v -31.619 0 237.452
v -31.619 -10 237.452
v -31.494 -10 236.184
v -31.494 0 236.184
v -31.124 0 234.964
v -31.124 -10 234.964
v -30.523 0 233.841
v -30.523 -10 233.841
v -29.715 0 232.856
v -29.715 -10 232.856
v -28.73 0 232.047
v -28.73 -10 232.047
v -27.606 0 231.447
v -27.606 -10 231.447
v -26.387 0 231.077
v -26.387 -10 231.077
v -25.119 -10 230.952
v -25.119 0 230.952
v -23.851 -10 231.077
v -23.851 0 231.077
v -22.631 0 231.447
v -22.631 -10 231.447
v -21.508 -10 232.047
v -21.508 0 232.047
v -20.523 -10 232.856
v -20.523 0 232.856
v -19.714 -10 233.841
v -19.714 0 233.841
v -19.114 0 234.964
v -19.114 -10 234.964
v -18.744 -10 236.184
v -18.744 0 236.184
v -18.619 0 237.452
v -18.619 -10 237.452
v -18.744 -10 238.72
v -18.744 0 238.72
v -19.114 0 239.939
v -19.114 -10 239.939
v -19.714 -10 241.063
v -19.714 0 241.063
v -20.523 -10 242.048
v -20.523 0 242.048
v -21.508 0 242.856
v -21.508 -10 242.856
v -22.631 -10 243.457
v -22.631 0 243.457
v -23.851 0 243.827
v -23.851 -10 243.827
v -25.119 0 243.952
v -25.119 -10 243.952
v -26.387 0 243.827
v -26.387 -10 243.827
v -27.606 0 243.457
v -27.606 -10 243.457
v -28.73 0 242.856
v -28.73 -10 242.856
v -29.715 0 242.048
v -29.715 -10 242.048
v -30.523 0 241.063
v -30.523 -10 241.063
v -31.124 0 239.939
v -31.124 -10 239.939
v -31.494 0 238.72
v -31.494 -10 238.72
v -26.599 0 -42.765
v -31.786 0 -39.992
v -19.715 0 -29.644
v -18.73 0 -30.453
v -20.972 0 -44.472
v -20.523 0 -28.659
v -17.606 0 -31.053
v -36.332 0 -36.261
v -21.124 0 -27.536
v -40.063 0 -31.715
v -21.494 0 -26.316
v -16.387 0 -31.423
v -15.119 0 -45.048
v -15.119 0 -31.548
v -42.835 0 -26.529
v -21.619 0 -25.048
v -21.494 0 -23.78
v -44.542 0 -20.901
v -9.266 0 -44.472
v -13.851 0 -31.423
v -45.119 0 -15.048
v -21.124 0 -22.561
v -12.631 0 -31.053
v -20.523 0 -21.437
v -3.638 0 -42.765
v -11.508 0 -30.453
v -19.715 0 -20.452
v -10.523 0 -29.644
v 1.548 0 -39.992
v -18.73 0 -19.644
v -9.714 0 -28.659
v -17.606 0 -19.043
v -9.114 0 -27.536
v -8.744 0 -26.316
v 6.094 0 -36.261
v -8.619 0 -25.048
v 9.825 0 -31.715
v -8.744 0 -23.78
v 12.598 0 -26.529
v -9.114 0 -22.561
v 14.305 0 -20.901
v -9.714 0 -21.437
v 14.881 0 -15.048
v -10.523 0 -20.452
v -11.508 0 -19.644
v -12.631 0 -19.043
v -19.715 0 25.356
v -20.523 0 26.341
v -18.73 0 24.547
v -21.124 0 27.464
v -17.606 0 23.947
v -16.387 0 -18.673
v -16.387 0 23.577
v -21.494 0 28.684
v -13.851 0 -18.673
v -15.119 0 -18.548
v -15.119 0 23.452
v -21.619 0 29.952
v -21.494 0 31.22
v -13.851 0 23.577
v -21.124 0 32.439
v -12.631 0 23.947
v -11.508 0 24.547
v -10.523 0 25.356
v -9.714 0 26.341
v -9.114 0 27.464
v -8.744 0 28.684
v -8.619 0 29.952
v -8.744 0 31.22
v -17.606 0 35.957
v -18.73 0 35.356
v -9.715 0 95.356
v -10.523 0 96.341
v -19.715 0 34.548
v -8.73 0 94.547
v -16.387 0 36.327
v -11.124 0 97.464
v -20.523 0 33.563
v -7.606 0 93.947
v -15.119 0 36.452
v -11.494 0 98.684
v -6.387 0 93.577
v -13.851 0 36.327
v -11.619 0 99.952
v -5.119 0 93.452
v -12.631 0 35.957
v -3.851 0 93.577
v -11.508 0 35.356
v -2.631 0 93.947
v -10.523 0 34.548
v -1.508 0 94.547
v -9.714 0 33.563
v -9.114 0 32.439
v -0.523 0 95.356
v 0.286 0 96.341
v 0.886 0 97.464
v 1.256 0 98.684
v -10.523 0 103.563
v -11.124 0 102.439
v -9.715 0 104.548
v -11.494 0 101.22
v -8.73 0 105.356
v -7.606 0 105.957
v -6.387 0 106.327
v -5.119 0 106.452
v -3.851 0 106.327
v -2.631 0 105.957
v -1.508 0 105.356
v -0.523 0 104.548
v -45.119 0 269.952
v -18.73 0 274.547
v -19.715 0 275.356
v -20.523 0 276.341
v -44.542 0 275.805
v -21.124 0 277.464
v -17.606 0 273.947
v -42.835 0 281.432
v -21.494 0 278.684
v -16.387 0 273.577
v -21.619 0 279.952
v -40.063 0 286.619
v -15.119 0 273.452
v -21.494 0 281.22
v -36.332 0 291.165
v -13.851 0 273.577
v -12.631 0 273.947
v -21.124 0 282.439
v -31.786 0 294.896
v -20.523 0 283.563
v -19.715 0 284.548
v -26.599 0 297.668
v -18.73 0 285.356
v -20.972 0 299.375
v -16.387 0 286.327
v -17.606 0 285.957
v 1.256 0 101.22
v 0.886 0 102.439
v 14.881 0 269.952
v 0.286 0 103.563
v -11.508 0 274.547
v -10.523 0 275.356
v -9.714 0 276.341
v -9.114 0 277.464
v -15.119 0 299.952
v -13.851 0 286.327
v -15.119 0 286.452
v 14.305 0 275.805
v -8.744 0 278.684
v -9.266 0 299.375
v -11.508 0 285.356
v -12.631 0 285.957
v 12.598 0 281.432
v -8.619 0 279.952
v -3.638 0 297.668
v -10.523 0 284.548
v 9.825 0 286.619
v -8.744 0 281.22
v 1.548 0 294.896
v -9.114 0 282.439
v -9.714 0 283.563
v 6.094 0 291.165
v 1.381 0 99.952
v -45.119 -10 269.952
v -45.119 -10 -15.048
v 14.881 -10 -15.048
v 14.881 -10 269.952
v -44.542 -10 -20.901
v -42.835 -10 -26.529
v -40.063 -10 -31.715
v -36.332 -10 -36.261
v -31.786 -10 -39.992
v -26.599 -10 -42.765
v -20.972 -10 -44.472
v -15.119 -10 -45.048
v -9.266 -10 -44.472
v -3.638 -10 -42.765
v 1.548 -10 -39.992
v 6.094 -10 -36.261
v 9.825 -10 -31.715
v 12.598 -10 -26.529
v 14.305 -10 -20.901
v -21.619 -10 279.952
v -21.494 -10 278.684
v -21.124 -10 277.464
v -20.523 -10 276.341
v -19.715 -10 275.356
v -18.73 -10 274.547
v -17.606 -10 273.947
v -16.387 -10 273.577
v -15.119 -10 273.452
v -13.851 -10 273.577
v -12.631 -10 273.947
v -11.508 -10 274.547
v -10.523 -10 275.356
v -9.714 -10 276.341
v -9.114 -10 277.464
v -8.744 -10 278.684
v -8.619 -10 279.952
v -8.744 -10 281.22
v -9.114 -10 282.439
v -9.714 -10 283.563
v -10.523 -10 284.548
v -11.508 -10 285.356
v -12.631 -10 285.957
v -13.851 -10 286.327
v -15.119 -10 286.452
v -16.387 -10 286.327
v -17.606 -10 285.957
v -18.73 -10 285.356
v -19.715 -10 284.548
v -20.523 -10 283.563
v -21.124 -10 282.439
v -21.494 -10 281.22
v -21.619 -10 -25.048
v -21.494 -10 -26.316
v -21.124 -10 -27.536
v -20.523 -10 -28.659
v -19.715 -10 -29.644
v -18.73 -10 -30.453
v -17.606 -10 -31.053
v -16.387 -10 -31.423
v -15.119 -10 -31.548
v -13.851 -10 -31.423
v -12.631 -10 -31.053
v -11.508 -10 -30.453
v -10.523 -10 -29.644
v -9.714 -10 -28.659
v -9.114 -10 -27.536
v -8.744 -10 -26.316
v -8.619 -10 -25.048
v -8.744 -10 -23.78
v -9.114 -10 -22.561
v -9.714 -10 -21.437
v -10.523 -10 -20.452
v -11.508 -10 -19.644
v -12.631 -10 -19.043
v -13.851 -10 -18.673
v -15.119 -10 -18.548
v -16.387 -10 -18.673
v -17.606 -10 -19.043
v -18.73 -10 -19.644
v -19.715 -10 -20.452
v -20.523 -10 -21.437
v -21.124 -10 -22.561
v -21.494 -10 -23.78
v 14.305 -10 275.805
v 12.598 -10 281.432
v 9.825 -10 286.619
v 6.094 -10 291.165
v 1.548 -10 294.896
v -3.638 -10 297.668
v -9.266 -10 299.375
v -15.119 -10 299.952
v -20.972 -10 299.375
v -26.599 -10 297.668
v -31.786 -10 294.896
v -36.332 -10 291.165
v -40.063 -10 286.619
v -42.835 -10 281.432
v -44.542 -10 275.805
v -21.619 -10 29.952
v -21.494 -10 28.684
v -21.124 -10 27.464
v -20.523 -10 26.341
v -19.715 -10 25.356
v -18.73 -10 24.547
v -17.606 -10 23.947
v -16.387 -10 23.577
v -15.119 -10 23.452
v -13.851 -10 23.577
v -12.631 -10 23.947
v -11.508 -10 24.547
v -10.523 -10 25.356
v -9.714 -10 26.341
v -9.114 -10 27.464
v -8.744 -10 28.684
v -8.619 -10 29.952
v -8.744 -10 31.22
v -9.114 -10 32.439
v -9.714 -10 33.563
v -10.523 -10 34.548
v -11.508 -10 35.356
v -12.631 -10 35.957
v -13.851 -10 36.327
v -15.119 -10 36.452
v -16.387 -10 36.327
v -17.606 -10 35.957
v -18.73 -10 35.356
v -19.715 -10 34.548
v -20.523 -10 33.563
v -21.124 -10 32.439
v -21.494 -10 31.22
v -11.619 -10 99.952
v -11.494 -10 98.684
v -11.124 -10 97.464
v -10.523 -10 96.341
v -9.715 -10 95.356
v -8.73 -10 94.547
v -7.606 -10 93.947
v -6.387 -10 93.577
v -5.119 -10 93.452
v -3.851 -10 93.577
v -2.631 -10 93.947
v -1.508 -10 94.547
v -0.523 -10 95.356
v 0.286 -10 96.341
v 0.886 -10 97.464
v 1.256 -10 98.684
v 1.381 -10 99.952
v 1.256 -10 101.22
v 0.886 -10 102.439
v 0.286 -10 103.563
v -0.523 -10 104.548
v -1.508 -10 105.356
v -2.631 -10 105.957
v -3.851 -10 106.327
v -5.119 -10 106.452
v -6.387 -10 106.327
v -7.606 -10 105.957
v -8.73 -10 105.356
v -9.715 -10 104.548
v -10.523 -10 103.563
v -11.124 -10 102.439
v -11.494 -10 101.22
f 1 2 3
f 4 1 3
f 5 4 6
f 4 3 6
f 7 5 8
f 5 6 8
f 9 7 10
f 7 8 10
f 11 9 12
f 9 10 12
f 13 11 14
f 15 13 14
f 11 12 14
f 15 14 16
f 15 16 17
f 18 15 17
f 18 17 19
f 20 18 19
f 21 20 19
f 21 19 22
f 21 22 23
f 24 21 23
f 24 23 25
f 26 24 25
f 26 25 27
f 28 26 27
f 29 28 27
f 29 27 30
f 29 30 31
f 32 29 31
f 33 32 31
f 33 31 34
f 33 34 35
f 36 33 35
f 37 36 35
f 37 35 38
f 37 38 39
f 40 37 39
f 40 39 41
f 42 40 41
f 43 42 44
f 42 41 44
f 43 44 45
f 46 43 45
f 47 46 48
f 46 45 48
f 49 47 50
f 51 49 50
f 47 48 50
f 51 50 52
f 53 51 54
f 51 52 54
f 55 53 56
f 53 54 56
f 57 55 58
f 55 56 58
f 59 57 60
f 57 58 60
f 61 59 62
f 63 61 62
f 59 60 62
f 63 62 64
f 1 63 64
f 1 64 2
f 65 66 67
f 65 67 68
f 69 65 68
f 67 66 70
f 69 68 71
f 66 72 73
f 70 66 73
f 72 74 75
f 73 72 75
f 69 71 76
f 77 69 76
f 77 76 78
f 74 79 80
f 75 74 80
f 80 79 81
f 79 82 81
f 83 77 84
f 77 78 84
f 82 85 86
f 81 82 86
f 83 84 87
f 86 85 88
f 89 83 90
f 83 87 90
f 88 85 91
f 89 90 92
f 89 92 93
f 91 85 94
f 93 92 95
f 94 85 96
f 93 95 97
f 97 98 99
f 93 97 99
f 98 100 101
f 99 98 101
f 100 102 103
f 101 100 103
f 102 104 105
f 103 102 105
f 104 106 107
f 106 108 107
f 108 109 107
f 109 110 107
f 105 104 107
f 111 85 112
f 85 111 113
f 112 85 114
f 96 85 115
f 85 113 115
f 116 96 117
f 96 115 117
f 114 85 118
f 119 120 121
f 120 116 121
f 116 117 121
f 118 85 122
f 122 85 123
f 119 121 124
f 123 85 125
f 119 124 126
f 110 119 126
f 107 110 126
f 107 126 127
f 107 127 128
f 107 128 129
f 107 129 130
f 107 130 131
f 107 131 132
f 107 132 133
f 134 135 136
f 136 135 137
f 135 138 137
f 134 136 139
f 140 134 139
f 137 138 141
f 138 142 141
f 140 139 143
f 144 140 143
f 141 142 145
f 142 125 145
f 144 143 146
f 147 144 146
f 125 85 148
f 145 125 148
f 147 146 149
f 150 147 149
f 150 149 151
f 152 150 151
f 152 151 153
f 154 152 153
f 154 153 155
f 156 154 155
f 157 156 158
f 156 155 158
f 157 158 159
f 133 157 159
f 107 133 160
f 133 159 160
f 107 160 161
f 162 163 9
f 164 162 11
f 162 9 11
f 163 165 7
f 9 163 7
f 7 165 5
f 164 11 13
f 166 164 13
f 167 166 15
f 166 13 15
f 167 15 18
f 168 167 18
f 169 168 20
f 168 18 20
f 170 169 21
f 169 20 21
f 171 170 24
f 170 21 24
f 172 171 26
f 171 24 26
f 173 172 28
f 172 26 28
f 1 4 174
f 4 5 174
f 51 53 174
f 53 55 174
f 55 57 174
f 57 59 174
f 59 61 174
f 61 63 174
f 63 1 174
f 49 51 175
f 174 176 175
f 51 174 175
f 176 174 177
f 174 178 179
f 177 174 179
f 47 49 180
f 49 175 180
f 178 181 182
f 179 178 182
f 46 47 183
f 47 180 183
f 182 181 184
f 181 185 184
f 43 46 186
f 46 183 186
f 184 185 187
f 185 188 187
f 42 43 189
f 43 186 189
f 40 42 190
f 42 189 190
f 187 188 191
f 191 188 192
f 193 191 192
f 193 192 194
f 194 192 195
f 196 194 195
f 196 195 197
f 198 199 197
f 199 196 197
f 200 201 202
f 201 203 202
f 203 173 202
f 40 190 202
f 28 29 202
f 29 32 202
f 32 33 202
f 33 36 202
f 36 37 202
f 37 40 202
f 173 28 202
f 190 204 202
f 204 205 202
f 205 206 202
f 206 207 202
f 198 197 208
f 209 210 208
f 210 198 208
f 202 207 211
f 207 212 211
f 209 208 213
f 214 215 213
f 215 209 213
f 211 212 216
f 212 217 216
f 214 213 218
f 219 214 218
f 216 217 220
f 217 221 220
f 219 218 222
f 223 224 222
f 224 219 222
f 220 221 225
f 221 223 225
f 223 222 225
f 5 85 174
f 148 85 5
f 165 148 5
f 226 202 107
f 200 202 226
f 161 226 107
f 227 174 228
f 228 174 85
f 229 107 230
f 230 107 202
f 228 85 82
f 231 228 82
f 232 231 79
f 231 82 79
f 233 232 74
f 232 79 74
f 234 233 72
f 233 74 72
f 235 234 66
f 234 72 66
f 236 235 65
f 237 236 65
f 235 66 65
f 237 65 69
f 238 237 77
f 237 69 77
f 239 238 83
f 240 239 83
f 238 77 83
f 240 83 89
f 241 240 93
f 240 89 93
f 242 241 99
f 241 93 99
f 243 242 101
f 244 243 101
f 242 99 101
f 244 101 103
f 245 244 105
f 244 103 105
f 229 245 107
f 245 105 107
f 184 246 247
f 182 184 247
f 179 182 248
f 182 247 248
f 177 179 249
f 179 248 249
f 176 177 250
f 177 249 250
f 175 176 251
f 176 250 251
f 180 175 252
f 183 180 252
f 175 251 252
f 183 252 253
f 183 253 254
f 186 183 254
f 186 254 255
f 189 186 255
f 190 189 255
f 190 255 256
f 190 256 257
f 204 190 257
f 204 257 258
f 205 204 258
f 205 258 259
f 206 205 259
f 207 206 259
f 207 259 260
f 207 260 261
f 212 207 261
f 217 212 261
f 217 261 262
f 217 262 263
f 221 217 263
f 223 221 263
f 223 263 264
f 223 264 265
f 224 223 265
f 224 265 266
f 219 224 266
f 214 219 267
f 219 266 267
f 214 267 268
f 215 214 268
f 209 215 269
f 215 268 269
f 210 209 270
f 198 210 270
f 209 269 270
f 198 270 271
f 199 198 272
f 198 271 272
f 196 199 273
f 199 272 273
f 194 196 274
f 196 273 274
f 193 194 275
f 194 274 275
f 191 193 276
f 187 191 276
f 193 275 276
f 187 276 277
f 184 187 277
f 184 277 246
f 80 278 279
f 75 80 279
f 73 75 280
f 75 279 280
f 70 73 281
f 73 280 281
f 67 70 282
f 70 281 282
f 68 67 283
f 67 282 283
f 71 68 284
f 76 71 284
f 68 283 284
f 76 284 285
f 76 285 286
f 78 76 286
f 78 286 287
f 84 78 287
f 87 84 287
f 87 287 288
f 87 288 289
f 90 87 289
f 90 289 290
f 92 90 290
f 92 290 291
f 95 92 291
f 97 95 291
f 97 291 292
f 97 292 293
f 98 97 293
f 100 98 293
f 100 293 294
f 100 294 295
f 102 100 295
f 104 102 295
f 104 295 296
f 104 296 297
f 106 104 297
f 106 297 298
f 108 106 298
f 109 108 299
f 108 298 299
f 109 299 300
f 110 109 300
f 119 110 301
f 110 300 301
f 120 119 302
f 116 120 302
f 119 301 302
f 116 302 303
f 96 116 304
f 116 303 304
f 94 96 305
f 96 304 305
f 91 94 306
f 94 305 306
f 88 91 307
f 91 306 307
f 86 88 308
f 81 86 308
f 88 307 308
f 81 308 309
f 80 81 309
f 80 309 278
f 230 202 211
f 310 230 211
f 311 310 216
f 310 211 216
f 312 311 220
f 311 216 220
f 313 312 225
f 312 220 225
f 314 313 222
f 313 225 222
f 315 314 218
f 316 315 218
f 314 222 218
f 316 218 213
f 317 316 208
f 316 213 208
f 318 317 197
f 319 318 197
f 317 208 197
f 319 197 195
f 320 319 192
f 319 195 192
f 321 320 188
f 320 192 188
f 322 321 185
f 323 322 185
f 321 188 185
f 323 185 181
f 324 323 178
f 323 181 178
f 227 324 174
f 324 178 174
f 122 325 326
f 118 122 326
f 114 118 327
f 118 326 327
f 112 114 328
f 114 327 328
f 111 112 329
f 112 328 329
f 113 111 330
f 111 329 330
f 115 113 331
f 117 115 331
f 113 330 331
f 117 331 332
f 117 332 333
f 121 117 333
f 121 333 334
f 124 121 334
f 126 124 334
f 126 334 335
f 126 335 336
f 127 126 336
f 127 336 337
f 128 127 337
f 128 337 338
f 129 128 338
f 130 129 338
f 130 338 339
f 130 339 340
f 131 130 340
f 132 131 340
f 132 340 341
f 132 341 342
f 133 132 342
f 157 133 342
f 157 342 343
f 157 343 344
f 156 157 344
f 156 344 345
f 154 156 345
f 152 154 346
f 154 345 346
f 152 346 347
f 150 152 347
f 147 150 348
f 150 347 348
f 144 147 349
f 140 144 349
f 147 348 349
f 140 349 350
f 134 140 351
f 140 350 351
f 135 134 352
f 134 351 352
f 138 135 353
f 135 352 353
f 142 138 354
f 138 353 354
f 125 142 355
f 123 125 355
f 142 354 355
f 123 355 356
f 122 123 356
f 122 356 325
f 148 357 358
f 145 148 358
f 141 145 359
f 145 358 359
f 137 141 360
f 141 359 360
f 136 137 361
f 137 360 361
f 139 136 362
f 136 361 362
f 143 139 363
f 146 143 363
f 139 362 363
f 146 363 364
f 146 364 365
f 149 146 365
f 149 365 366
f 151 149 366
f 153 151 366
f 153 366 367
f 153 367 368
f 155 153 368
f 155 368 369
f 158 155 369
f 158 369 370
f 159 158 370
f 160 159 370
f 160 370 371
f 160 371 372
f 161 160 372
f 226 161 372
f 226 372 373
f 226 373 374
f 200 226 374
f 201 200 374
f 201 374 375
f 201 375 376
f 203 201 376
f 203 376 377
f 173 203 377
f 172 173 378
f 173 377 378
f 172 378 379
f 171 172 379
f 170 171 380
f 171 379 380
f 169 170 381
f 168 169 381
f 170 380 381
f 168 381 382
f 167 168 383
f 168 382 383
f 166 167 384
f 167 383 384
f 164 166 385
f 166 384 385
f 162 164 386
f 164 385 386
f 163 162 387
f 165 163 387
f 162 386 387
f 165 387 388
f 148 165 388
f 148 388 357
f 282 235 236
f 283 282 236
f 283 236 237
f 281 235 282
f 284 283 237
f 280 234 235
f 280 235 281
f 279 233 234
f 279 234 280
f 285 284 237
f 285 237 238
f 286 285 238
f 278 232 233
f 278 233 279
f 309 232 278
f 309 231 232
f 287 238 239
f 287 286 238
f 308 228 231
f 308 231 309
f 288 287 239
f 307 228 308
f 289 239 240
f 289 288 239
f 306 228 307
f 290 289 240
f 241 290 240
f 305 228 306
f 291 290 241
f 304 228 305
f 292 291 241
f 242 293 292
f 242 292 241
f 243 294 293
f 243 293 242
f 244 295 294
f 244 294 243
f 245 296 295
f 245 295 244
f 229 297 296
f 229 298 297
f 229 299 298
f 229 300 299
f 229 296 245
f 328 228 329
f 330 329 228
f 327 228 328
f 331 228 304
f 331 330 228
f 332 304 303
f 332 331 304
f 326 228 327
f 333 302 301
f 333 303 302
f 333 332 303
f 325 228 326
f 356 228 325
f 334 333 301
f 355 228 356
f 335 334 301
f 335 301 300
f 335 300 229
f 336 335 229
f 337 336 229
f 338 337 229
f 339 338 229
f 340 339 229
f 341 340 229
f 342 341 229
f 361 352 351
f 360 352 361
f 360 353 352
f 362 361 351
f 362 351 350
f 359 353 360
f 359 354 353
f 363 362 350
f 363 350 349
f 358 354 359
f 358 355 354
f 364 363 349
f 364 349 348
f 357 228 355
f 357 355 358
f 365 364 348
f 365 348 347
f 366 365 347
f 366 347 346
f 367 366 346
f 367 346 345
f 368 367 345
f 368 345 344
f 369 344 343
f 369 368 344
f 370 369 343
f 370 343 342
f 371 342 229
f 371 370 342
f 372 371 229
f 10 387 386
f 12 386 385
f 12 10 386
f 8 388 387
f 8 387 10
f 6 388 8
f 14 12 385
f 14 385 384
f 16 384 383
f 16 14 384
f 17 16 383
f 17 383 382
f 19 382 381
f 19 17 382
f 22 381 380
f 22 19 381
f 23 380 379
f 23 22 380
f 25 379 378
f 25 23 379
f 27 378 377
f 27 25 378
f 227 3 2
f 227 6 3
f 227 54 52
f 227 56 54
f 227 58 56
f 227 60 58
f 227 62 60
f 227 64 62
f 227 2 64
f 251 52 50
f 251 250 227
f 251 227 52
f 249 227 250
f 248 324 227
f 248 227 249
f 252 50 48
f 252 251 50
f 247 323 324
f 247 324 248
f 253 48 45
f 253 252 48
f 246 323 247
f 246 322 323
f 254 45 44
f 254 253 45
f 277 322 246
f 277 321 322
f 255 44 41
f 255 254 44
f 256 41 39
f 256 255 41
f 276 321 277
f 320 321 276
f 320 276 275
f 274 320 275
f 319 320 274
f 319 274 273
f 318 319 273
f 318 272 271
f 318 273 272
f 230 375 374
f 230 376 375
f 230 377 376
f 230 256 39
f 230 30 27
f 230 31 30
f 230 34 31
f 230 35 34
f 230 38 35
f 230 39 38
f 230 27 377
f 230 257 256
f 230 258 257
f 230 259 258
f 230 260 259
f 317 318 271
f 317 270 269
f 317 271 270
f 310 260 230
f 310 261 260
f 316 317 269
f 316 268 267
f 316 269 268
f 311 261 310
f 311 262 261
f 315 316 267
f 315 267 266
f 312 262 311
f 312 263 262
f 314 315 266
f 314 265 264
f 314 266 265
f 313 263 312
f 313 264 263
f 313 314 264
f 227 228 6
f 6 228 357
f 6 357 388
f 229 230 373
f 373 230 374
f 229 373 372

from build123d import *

# Parameters (mm, degrees)
F1_DEPTH = 10
F2_D     = 13
F3_D     = 13
F4_D     = 13


with BuildPart() as f1:
    # F0 (on Front) → F1 (new body)
    with BuildSketch(Plane.XZ):
        with BuildLine():
            ThreePointArc((14.88112472, 269.9518393504), (-15.11887528, 299.9518393504), (-45.11887528, 269.9518393504))
            Line((-45.11887528, 269.9518393504), (-45.11887528, -15.0481606496))
            ThreePointArc((-45.11887528, -15.0481606496), (-15.11887528, -45.0481606496), (14.88112472, -15.0481606496))
            Line((14.88112472, -15.0481606496), (14.88112472, 269.9518393504))
        make_face()
    extrude(amount=F1_DEPTH)

    # F2 (through all)
    with Locations(Plane(origin=(0, 0, 0), x_dir=(1, 0, 0), z_dir=(0, 1, 0))):
        with Locations((-15.11887528, -29.9518393504), (-15.11887528, 25.0481606496)):
            Hole(F2_D / 2)

    # F3 (through all)
    with Locations(Plane(origin=(0, 0, 0), x_dir=(1, 0, 0), z_dir=(0, 1, 0))):
        with Locations((-15.11887528, -279.9518393504)):
            Hole(F3_D / 2)

    # F4 (through all)
    with Locations(Plane(origin=(0, 0, 0), x_dir=(1, 0, 0), z_dir=(0, 1, 0))):
        with Locations((-25.11887528, -237.4518393504), (-5.11887528, -99.9518393504)):
            Hole(F4_D / 2)


solid = f1.part
